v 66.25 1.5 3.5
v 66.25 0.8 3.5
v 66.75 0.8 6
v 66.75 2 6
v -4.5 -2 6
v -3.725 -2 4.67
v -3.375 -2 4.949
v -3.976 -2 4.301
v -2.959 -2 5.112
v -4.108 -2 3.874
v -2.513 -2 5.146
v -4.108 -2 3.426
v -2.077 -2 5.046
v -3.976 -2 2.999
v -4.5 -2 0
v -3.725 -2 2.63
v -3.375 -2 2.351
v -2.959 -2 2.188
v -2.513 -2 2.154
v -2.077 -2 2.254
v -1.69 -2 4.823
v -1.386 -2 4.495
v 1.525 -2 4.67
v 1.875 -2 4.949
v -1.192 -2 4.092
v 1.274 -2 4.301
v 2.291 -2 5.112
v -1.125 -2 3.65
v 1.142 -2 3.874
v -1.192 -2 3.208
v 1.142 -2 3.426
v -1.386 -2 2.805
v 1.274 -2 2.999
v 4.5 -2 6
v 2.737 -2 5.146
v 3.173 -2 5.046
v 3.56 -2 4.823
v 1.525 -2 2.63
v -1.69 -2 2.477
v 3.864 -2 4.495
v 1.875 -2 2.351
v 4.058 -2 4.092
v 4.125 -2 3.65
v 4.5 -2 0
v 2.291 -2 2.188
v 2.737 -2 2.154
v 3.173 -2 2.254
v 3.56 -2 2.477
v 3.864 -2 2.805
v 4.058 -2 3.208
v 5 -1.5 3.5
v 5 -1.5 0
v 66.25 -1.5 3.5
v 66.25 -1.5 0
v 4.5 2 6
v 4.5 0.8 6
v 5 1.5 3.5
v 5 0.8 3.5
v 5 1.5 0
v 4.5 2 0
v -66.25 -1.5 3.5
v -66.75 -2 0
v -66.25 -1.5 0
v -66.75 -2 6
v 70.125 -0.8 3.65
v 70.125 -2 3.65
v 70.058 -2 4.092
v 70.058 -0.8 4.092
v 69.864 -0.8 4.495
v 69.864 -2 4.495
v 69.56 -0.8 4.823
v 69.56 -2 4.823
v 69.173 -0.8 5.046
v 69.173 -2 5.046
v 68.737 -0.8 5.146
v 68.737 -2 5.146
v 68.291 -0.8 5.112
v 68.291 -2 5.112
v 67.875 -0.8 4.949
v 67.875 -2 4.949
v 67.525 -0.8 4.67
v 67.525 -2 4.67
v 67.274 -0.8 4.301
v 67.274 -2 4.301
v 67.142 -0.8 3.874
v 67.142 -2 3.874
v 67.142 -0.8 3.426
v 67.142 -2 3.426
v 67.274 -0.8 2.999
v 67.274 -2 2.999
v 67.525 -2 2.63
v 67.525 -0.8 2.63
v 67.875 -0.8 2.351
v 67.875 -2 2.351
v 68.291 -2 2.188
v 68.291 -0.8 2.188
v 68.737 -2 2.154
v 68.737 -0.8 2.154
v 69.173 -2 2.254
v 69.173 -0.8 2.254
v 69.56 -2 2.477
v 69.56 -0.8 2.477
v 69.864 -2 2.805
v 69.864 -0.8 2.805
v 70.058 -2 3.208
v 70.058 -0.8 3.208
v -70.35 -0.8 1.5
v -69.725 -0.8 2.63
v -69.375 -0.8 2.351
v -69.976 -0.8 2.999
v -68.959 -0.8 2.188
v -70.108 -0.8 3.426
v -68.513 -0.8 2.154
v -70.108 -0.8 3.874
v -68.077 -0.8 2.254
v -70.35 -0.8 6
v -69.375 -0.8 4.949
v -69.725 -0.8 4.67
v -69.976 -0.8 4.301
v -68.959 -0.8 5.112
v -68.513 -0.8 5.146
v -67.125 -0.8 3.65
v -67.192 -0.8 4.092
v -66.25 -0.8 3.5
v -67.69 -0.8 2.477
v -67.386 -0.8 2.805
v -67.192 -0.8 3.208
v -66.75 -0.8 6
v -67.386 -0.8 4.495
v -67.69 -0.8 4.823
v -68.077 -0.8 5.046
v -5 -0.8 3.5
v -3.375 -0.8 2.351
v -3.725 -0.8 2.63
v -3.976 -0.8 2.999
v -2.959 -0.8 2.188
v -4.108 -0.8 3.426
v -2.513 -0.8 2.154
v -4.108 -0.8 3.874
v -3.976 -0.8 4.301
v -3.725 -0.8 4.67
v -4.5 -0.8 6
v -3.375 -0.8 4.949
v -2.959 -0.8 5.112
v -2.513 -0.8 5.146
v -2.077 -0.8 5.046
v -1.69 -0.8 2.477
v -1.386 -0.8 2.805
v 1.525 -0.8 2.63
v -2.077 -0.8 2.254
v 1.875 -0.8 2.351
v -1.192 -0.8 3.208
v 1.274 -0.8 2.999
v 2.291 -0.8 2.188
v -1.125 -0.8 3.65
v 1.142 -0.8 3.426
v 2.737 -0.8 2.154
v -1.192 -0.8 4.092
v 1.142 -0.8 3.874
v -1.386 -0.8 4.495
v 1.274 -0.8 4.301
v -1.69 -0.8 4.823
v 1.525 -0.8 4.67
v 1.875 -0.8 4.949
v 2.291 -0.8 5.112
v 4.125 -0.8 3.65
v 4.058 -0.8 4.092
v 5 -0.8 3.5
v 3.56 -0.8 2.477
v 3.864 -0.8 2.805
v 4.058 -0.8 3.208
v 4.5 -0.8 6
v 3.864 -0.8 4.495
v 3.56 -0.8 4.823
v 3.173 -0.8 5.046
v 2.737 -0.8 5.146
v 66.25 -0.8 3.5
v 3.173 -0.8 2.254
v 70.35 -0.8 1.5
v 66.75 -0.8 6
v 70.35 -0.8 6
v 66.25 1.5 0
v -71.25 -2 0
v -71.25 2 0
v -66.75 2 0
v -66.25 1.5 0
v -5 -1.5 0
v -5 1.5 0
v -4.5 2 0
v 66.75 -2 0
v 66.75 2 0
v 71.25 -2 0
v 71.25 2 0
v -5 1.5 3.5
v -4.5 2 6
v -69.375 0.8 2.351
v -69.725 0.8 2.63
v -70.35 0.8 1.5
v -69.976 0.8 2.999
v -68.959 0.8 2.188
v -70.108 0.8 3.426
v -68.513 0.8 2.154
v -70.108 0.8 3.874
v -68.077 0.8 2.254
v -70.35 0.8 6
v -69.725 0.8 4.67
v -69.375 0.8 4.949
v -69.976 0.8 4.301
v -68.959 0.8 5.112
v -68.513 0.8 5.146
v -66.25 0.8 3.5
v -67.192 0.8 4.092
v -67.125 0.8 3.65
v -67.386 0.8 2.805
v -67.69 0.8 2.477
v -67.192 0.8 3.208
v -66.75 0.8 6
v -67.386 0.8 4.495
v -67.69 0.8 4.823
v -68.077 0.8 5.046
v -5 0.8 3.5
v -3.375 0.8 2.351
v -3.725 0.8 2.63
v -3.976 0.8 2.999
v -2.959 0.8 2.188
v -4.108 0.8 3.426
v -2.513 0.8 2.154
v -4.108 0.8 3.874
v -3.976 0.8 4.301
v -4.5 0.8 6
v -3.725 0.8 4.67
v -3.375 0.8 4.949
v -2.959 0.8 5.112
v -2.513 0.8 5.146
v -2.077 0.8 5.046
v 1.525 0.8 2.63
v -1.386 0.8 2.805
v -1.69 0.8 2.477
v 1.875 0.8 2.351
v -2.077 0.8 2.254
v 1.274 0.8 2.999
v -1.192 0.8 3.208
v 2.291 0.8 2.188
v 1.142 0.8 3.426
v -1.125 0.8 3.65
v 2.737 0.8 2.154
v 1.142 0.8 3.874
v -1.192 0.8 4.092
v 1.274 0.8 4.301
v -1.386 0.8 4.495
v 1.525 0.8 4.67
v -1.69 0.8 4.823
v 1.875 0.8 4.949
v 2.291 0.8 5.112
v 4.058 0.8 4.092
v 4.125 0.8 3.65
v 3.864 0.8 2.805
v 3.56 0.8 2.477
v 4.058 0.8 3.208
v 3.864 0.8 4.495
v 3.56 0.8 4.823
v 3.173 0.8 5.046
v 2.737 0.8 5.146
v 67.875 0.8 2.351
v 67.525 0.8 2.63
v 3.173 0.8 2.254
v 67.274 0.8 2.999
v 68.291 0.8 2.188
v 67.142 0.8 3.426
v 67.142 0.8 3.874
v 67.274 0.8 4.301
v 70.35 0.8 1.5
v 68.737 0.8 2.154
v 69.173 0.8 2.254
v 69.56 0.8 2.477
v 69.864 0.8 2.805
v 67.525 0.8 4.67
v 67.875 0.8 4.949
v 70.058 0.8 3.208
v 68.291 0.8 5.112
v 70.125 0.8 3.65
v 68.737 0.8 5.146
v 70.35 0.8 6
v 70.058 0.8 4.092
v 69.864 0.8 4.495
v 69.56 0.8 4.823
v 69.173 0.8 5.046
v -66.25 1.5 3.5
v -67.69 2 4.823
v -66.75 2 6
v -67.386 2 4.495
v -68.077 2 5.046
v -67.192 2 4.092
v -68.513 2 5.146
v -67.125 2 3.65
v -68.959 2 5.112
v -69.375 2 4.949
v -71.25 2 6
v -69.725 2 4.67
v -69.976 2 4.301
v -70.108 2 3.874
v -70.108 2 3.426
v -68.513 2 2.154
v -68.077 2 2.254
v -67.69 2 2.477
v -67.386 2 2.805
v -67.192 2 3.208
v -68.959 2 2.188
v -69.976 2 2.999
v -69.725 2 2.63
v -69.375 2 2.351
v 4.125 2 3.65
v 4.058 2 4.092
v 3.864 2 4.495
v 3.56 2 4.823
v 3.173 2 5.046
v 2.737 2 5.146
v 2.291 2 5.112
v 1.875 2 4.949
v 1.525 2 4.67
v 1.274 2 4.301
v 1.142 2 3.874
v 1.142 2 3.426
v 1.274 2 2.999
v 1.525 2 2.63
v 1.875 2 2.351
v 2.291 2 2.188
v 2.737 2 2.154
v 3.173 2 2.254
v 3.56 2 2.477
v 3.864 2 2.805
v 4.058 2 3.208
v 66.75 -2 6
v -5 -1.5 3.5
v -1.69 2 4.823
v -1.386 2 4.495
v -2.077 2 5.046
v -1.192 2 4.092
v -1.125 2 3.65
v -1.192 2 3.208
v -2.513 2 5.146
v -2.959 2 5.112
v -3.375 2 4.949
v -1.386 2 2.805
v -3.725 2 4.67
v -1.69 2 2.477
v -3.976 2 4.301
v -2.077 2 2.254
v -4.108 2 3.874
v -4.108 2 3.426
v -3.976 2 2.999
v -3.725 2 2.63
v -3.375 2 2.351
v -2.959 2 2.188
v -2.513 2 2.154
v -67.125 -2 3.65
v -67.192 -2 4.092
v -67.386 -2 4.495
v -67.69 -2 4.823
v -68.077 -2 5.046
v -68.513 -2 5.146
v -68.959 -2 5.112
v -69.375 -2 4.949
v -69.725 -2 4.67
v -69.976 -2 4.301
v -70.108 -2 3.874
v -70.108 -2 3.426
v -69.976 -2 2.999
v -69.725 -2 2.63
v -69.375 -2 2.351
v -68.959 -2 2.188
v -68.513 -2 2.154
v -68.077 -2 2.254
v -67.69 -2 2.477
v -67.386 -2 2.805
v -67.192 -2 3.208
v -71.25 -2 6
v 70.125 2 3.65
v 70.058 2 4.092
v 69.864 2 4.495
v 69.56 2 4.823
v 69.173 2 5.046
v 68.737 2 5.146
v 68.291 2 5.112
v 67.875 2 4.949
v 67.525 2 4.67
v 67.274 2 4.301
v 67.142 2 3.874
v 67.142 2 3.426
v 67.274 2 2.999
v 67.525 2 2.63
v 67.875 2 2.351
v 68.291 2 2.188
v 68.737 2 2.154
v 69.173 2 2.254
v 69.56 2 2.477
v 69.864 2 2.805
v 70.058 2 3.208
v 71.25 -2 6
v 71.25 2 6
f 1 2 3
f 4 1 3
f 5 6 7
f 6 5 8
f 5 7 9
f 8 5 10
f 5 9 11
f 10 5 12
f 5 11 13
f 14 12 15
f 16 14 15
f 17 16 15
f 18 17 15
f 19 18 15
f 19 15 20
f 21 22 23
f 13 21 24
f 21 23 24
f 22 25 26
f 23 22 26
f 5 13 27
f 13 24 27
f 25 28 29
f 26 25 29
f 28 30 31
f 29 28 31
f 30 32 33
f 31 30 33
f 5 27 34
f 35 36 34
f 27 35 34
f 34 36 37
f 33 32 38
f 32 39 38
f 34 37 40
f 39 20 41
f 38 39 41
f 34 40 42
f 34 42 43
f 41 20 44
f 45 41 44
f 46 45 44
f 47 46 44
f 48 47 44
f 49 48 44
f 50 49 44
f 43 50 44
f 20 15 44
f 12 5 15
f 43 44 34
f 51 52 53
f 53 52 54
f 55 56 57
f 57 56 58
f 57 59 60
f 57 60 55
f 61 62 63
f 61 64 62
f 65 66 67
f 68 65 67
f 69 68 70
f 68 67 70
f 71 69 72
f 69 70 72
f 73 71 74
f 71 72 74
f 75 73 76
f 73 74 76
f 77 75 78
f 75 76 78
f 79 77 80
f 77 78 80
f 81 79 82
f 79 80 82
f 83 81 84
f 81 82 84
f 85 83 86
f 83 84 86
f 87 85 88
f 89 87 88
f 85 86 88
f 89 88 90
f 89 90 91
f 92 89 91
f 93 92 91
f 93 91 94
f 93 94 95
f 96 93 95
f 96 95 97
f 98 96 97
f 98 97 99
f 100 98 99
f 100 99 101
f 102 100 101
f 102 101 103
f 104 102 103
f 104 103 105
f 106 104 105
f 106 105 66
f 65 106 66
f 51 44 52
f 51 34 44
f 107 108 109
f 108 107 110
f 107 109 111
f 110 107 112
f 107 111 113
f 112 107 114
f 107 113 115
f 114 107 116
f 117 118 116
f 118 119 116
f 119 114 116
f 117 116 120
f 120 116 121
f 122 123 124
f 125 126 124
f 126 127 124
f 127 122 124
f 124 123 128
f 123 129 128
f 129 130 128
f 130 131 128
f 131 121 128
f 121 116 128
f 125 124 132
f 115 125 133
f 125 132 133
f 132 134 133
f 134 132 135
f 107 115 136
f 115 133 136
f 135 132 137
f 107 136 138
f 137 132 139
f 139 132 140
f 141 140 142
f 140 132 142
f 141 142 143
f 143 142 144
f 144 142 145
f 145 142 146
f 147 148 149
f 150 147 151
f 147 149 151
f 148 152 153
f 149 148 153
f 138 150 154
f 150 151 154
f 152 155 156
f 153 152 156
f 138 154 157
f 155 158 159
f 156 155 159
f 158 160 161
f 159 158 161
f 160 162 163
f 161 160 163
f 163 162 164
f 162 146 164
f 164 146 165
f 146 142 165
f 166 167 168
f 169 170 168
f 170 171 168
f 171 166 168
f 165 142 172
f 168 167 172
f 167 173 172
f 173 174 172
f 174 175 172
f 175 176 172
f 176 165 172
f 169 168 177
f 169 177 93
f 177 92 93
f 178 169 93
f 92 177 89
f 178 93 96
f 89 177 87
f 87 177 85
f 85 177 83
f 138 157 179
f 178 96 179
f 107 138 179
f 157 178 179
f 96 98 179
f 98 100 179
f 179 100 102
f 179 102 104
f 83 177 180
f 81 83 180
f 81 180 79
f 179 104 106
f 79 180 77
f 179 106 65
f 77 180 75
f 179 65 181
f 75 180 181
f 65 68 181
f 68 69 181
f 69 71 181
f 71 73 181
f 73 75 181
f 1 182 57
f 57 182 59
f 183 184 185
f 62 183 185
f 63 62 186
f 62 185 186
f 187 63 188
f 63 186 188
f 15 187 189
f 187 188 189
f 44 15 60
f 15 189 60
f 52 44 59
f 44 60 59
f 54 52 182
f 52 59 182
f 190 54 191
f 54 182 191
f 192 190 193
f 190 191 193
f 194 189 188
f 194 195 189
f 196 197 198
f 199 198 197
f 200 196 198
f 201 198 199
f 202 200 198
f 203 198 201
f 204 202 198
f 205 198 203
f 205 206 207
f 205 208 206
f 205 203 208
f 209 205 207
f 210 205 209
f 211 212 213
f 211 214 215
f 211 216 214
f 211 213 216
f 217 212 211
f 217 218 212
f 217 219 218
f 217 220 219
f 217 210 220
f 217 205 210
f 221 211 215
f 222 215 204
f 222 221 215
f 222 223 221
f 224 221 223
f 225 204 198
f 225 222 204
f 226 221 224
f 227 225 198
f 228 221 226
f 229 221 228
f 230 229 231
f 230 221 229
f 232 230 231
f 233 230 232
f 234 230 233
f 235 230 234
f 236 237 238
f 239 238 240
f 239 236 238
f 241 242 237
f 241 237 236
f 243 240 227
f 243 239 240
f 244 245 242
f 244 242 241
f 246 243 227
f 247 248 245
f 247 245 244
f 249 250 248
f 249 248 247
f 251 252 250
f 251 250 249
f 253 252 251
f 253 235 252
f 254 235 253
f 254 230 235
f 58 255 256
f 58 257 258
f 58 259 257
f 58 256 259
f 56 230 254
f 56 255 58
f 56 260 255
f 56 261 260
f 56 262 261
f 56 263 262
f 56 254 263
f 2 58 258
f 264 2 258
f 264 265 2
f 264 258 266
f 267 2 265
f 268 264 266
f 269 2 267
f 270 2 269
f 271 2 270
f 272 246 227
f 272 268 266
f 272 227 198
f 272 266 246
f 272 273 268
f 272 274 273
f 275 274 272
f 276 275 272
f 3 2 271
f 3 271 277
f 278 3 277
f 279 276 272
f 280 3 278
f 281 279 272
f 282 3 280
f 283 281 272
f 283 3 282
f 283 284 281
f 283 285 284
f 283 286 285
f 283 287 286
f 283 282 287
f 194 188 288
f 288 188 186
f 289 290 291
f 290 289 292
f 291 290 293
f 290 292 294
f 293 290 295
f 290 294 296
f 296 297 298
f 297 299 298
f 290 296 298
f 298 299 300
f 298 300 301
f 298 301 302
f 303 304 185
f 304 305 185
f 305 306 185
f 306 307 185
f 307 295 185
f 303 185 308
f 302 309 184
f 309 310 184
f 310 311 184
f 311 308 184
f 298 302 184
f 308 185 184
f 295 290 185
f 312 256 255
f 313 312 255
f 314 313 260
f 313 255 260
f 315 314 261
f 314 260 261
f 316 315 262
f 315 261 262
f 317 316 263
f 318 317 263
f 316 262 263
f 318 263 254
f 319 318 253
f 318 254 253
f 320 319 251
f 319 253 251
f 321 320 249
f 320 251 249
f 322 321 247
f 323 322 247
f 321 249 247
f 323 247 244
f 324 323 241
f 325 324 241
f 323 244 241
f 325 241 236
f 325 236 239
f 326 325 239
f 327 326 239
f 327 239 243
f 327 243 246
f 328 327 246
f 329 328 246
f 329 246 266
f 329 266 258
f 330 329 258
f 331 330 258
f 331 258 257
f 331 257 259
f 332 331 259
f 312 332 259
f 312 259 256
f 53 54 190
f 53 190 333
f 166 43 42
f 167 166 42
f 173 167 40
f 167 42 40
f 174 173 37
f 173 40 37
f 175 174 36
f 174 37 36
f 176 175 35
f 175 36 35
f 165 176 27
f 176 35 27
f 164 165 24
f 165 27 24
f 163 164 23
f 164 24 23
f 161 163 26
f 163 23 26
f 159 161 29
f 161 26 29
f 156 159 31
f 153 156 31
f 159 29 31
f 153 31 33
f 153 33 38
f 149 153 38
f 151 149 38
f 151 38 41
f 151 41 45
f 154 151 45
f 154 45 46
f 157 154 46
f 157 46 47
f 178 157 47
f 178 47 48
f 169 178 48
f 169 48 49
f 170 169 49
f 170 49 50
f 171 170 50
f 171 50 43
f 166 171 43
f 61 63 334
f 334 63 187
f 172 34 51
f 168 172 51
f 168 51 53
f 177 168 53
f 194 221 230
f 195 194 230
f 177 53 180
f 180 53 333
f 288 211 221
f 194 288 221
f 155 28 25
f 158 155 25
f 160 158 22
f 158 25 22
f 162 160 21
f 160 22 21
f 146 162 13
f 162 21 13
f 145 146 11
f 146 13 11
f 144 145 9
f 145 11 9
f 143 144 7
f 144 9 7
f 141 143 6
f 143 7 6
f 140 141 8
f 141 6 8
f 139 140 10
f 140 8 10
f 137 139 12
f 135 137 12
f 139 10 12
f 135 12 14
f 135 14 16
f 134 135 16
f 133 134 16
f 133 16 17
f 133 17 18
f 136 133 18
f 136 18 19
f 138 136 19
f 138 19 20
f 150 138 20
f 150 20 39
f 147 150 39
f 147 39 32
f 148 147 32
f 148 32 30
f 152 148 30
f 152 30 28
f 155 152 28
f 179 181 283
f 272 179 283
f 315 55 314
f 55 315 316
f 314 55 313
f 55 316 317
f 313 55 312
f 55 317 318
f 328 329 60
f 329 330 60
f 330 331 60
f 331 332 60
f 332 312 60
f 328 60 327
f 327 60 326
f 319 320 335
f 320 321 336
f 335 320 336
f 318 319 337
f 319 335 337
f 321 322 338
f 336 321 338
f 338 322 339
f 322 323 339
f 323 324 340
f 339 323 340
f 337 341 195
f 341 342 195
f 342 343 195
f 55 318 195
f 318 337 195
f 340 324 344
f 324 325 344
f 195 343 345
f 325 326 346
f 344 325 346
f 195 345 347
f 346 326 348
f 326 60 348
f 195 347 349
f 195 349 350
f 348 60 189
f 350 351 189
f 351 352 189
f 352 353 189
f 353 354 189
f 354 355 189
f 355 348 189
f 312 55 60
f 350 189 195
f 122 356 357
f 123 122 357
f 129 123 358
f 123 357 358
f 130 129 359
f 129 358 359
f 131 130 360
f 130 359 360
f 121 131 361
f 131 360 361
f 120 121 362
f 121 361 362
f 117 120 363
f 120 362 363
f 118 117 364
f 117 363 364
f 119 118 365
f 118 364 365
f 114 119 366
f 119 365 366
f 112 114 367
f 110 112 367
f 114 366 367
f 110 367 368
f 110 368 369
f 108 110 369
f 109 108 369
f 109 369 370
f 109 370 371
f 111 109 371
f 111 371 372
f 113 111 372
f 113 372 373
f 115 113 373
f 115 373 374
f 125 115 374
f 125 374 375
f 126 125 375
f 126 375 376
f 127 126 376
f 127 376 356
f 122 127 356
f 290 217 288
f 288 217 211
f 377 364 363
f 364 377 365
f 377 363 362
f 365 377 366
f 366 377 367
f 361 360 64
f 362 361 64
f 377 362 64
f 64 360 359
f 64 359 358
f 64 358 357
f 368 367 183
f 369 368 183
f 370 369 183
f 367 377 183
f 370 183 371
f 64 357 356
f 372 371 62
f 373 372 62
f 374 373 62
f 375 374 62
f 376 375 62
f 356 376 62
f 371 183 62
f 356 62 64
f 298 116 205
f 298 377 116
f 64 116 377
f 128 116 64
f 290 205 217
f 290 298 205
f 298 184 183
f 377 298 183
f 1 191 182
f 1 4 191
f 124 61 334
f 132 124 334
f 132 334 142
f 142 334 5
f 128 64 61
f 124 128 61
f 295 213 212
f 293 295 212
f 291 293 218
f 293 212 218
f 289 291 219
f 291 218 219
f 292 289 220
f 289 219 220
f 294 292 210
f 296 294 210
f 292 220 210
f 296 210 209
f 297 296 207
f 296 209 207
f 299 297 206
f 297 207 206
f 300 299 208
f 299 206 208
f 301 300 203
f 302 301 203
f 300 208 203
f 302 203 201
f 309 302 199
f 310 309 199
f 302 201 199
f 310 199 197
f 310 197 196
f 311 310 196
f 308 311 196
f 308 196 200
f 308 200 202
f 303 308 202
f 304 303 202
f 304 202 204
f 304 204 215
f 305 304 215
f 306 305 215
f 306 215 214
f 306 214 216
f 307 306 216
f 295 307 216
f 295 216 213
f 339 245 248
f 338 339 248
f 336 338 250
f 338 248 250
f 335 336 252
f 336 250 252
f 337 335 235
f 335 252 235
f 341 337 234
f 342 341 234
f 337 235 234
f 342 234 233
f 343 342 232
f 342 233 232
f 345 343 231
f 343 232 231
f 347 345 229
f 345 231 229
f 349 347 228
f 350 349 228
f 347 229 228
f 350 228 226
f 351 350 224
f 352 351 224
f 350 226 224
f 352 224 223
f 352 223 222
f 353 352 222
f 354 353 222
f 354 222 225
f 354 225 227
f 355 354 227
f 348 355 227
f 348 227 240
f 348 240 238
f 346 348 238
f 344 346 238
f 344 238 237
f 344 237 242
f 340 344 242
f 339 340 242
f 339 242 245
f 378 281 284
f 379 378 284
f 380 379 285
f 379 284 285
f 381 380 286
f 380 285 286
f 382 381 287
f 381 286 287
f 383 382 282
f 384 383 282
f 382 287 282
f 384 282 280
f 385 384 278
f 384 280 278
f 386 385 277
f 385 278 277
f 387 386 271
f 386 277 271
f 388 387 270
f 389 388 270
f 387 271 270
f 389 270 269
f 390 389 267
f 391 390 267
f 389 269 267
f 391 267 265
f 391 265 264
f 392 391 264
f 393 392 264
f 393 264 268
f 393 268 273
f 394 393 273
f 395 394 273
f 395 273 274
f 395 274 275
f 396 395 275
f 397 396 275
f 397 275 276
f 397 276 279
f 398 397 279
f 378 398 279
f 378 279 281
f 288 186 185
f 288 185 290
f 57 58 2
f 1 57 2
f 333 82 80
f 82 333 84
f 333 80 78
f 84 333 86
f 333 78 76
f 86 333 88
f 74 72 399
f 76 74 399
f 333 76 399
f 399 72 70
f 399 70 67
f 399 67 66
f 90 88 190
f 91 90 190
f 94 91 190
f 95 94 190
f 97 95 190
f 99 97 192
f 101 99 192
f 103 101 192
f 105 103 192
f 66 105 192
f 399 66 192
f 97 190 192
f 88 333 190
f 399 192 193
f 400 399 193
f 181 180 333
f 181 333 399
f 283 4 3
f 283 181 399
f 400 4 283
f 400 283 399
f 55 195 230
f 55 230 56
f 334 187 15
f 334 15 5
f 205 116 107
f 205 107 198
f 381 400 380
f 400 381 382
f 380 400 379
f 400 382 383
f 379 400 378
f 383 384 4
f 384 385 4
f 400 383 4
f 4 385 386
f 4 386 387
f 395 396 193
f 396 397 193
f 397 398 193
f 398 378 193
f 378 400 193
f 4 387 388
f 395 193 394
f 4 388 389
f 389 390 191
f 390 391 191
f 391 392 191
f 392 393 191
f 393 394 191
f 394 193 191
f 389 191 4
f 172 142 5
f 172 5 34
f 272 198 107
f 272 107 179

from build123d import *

# Parameters (mm, degrees)
PAD_DEPTH       = 6
SKETCH001_W     = 140.7
SKETCH001_H     = 1.6
POCKET_DEPTH    = 4.5
SKETCH002_R     = 1.5
POCKET001_DEPTH = 4.001


with BuildPart() as part:
    # Sketch → Pad (new body)
    with BuildSketch(Plane.XY):
        Polygon((-71.25, 2), (-71.25, -2), (-66.75, -2), (-66.25, -1.5), (-5, -1.5), (-4.5, -2), (4.5, -2), (5, -1.5), (66.25, -1.5), (66.75, -2), (71.25, -2), (71.25, 2), (66.75, 2), (66.25, 1.5), (5, 1.5), (4.5, 2), (-4.5, 2), (-5, 1.5), (-66.25, 1.5), (-66.75, 2), align=None)
    extrude(amount=PAD_DEPTH)

    # Sketch001 (on Face22 of Pad) → Pocket (cut)
    with BuildSketch(Plane.XY.offset(6)):
        Rectangle(SKETCH001_W, SKETCH001_H)
    extrude(amount=-POCKET_DEPTH, mode=Mode.SUBTRACT)

    # Sketch002 (on Face10 of Pocket) → Pocket001 (cut, through all)
    with BuildSketch(Plane.XZ.offset(2)):
        with Locations((-68.625, 3.65)):
            Circle(SKETCH002_R)
        with Locations((-2.625, 3.65)):
            Circle(SKETCH002_R)
        with Locations((2.625, 3.65)):
            Circle(SKETCH002_R)
        with Locations((68.625, 3.65)):
            Circle(SKETCH002_R)
        Polygon((-66.75, 6), (-66.25, 3.5), (-5, 3.5), (-4.5, 6), align=None)
        Polygon((4.5, 6), (5, 3.5), (66.25, 3.5), (66.75, 6), align=None)
    extrude(amount=-POCKET001_DEPTH, mode=Mode.SUBTRACT)


solid = part.part
